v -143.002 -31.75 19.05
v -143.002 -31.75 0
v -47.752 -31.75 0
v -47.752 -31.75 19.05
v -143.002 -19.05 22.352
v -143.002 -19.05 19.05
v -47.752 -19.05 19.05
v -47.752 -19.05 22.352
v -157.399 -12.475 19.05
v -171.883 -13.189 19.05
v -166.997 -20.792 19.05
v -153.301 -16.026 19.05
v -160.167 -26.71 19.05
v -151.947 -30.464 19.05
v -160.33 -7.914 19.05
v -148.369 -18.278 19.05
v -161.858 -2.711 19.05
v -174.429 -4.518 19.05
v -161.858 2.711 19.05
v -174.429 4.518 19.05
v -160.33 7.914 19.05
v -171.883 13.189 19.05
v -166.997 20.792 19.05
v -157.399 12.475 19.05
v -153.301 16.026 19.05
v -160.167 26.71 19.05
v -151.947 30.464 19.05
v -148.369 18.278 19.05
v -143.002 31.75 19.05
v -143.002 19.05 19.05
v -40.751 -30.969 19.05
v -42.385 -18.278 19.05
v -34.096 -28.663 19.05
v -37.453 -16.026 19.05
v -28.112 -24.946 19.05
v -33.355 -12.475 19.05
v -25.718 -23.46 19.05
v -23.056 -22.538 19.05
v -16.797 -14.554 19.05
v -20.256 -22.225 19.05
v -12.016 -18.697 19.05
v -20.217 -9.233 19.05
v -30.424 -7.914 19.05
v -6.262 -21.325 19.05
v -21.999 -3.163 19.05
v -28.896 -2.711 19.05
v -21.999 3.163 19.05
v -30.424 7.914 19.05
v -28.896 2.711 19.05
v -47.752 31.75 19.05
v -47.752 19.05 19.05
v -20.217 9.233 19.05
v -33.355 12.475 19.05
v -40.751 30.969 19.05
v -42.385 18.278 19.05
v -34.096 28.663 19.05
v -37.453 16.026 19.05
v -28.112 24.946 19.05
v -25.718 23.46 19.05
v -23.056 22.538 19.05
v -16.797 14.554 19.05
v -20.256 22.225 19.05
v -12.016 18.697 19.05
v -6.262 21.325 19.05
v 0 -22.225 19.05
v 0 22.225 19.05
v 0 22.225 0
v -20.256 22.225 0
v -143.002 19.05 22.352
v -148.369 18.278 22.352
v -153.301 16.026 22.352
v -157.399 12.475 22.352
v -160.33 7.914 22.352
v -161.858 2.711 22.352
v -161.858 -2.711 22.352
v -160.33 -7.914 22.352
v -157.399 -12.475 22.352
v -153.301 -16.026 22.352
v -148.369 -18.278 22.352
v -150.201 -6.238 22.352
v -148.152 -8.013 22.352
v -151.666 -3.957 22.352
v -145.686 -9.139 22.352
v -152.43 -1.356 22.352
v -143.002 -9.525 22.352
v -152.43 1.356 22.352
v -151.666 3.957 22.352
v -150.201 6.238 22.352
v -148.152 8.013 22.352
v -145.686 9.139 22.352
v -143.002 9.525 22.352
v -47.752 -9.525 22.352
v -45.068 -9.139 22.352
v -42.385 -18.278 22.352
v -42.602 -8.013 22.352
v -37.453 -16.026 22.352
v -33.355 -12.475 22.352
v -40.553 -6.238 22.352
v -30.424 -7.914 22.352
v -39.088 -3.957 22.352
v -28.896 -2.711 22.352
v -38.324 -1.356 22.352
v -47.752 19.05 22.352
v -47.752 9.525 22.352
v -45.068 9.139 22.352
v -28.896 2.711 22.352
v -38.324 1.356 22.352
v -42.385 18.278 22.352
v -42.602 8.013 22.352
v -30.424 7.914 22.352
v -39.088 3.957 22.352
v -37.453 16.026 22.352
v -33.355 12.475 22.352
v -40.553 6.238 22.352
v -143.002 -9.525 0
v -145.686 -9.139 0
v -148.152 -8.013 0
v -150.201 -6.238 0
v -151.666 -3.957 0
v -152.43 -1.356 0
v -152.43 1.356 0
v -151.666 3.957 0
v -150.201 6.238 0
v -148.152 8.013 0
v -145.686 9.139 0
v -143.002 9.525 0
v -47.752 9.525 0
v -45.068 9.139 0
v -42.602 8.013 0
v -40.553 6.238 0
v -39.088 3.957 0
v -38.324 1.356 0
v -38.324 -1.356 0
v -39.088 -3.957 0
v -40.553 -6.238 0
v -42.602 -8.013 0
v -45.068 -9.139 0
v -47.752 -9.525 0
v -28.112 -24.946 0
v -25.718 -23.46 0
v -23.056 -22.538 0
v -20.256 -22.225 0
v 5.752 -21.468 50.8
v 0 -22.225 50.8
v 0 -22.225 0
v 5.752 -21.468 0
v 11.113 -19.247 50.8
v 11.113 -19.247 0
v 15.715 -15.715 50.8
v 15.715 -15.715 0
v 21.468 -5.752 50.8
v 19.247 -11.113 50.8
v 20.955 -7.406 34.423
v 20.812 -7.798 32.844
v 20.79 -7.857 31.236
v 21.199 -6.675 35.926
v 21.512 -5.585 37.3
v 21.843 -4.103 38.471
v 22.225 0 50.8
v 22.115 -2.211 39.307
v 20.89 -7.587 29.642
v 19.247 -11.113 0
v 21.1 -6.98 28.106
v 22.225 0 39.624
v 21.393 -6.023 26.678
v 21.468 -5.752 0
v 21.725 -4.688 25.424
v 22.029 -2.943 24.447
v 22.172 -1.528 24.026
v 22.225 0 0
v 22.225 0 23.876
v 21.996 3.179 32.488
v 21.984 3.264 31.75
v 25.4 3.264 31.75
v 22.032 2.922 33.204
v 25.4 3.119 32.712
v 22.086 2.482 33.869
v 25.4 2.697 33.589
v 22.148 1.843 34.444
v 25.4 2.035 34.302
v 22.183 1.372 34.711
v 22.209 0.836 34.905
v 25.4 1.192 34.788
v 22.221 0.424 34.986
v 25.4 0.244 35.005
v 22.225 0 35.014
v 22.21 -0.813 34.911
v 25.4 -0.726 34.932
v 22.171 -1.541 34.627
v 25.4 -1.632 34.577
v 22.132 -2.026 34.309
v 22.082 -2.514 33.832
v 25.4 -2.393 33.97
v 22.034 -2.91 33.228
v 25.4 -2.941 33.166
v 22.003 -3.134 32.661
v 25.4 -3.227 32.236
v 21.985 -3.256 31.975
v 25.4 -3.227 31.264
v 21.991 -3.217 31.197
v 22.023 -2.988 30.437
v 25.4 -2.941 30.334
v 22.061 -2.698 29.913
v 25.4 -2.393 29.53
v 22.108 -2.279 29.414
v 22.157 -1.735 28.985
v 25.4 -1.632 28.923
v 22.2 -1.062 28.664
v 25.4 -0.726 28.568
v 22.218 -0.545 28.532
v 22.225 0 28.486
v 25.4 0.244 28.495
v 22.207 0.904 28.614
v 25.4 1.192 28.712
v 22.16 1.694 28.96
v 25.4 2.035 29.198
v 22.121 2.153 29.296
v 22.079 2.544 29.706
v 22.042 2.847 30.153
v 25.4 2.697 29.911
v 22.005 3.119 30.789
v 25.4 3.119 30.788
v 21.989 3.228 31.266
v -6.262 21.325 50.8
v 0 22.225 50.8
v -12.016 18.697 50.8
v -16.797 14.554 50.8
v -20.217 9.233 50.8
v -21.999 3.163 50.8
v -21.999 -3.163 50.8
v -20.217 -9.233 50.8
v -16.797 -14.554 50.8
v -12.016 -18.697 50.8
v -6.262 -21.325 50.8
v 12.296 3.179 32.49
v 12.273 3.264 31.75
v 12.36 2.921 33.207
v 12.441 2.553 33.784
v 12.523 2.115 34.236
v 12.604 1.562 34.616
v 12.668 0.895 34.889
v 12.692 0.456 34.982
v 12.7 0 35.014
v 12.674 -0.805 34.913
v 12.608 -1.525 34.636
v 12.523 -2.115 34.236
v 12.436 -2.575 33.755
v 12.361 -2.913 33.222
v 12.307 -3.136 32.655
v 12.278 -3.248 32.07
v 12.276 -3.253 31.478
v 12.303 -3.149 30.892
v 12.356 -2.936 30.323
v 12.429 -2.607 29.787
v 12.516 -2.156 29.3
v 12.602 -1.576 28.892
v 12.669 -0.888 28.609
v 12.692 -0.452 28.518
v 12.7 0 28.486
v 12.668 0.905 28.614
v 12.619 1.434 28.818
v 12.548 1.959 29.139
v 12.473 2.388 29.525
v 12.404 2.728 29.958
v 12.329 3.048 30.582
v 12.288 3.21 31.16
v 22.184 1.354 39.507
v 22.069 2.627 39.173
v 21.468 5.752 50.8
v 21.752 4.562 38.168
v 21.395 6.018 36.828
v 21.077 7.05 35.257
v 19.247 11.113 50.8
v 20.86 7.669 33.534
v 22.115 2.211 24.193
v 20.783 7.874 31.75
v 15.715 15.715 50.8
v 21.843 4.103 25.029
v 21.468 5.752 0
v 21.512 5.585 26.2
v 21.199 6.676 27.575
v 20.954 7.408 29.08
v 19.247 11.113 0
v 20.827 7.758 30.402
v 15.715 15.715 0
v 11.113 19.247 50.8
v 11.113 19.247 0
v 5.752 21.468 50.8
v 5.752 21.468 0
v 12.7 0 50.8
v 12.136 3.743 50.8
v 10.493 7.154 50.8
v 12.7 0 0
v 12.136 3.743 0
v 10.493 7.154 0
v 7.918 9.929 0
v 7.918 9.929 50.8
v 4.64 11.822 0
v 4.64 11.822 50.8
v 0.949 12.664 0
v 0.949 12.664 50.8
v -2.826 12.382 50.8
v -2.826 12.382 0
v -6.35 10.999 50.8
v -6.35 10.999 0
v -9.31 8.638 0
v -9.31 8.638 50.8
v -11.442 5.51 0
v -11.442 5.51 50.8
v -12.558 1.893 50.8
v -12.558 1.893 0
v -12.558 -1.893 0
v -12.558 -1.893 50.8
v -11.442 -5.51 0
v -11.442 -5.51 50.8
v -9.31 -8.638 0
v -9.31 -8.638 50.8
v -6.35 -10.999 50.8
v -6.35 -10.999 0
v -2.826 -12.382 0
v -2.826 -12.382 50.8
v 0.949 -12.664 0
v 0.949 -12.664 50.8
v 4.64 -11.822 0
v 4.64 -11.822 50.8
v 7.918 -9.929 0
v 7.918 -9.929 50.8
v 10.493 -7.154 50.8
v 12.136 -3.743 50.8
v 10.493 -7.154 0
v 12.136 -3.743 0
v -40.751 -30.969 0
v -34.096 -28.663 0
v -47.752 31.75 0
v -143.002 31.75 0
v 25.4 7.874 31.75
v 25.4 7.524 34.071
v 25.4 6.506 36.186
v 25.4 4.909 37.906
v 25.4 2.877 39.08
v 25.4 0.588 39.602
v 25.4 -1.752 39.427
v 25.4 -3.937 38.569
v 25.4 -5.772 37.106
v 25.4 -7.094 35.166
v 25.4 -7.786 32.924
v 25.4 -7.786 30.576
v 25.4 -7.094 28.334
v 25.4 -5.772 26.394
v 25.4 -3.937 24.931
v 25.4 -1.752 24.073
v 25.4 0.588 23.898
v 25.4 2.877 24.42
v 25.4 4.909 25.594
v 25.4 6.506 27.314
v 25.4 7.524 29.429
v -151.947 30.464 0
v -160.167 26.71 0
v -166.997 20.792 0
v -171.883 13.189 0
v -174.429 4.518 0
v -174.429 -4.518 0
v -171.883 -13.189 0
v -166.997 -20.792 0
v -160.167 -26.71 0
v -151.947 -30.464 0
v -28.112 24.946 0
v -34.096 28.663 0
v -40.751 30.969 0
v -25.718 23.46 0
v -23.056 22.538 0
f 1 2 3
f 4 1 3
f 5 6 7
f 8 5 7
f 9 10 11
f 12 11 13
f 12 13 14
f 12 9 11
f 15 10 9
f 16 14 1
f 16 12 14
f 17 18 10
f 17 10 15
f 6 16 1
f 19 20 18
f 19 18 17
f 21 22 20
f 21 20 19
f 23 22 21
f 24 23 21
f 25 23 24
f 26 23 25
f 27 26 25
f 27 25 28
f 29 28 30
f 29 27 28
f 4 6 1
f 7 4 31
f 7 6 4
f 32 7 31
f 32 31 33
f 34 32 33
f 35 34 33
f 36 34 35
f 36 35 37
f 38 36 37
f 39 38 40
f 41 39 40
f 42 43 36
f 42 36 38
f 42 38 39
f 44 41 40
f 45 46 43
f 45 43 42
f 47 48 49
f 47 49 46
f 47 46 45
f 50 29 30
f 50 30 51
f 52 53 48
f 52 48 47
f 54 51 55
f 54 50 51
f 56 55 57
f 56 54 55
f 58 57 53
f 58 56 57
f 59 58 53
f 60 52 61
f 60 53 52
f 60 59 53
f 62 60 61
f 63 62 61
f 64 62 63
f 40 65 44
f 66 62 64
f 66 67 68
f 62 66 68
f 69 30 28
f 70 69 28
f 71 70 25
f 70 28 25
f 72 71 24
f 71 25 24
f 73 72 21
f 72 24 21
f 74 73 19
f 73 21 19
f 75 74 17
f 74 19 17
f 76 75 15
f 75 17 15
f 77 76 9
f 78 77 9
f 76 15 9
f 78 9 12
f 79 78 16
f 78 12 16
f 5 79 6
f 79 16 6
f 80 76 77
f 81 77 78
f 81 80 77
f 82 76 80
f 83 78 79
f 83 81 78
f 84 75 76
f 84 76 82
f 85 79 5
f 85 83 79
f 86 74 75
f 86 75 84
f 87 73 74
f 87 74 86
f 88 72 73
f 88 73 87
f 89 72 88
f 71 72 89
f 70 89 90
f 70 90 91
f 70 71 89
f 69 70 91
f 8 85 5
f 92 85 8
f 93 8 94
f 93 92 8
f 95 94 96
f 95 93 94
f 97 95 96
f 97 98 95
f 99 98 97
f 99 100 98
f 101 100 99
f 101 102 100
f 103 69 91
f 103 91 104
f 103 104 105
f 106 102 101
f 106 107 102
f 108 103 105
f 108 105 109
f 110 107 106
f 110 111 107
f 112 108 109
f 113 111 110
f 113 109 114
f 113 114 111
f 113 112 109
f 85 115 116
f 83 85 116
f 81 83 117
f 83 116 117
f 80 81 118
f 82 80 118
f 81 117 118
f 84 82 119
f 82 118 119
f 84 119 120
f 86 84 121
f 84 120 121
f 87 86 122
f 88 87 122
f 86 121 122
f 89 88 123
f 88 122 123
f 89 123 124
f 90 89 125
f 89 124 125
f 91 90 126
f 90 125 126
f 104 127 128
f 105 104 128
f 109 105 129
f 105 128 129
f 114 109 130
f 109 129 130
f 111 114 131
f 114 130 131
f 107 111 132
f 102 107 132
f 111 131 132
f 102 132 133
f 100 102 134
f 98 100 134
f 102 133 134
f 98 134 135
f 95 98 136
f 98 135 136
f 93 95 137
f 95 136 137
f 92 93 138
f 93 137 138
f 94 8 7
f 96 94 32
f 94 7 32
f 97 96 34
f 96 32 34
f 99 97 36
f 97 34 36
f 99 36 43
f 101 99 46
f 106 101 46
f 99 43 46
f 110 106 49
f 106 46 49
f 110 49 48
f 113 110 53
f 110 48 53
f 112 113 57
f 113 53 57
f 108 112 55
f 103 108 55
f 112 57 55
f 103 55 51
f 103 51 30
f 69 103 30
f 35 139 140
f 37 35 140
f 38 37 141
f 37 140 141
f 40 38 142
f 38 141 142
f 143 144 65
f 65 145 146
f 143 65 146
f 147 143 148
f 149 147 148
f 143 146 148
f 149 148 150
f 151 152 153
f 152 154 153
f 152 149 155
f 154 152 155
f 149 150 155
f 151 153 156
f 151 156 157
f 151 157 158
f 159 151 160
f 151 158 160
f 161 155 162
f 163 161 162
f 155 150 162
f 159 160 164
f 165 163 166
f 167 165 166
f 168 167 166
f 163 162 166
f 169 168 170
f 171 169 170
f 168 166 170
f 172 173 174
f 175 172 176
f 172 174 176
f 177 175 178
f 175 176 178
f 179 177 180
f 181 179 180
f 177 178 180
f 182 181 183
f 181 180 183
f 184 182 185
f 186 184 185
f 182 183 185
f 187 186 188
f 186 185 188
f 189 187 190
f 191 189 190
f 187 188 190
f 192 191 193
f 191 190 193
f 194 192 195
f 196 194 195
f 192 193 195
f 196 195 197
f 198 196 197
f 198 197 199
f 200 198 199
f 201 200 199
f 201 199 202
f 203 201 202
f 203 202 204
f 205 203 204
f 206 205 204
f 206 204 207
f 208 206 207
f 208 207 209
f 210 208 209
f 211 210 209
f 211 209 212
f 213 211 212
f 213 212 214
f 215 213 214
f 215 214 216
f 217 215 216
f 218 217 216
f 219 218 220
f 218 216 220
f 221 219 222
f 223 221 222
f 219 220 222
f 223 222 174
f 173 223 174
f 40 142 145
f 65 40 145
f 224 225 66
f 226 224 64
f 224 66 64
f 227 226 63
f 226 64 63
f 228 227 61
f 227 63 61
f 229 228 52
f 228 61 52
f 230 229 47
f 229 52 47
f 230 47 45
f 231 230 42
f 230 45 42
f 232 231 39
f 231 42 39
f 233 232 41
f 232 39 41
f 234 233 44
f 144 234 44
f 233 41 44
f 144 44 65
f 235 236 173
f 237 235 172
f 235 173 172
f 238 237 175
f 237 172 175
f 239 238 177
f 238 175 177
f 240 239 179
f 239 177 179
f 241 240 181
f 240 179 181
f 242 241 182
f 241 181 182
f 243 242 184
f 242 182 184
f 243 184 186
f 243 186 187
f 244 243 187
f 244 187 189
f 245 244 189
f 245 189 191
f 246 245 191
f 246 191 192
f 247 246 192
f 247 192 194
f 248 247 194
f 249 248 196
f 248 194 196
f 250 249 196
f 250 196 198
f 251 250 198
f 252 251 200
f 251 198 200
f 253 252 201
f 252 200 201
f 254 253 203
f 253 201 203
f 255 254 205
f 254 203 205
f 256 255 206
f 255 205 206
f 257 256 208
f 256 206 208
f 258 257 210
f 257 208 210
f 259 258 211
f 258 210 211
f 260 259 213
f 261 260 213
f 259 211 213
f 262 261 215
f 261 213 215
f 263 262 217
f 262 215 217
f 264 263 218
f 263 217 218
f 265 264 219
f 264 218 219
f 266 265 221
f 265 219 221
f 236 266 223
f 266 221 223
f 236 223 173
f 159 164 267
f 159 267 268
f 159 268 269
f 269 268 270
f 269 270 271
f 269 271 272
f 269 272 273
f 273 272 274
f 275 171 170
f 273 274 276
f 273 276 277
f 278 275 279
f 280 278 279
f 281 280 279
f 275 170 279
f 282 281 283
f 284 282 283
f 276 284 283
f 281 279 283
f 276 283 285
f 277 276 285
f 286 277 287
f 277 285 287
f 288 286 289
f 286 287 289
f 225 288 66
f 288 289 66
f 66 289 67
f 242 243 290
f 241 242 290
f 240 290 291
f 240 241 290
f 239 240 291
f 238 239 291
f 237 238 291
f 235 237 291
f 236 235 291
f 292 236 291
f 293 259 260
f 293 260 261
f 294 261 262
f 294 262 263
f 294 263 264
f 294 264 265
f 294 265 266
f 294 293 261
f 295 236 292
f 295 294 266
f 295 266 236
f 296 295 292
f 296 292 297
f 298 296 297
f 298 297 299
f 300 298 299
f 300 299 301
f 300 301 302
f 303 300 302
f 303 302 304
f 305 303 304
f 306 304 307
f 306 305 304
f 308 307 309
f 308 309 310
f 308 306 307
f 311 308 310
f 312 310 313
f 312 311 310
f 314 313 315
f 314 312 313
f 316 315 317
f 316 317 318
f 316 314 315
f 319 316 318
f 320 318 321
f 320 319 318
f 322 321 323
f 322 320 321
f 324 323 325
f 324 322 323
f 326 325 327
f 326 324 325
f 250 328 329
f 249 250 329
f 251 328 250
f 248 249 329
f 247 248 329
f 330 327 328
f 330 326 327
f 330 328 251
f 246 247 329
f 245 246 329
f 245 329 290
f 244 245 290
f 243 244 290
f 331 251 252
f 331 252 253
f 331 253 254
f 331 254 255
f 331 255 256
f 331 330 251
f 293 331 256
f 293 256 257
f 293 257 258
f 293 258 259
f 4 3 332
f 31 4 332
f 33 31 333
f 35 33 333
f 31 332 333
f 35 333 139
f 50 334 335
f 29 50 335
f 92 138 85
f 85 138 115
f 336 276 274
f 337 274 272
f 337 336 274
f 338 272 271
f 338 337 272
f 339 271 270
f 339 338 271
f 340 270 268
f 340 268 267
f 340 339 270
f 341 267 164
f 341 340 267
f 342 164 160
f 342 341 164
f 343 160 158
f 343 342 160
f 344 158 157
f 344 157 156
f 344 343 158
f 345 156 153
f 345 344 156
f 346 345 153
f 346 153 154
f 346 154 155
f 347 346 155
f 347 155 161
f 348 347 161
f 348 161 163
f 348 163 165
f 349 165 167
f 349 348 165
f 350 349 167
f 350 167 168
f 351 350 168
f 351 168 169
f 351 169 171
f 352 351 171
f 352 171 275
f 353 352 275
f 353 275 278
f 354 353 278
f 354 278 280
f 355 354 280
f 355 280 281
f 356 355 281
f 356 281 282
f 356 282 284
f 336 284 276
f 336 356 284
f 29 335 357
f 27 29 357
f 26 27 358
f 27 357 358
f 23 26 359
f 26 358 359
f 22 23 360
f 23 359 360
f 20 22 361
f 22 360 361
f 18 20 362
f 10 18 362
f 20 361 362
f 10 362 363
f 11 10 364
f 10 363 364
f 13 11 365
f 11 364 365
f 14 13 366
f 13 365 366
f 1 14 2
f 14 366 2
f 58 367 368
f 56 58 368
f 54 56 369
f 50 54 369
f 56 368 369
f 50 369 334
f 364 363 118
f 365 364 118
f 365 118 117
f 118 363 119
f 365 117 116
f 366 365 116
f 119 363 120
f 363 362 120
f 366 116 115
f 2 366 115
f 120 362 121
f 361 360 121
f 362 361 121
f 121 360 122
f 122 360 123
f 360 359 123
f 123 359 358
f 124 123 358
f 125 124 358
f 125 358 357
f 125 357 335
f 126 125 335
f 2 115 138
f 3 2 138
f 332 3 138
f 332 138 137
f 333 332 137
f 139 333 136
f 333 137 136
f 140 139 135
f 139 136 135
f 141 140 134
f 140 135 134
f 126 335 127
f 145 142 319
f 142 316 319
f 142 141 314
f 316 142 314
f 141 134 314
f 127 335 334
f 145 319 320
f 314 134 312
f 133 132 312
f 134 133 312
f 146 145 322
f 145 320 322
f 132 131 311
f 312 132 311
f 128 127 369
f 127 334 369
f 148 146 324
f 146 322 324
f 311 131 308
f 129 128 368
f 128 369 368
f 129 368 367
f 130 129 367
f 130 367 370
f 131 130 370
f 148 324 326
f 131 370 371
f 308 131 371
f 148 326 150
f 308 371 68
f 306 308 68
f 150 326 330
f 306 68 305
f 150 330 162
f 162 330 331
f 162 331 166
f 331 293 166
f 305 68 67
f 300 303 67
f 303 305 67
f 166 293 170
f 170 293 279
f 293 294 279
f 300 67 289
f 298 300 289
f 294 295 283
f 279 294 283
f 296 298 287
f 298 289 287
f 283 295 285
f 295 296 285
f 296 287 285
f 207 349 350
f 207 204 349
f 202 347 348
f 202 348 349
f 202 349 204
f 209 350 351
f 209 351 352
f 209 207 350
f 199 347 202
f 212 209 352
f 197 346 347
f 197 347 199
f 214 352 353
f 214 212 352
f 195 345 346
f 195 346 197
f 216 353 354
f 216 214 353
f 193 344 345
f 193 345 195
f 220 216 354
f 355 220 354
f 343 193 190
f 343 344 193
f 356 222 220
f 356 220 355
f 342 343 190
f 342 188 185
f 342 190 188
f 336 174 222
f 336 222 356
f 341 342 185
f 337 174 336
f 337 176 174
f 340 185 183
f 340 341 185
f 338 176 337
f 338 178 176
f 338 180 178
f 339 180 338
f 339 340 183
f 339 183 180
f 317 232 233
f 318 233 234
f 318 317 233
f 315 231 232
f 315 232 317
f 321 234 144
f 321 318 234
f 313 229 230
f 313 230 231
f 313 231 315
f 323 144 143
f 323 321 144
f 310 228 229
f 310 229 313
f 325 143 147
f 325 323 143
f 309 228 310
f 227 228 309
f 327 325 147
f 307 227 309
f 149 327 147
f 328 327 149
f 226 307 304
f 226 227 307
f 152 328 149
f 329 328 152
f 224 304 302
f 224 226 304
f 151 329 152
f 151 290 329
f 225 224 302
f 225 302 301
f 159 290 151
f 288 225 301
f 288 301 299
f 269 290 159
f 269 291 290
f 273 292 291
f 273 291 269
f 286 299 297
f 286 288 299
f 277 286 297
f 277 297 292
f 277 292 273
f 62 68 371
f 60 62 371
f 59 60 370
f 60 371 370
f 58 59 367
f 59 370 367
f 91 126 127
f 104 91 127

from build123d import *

# Parameters (mm, degrees)
F0_R     = 12.7
F1_DEPTH = 50.8
F2_DEPTH = 19.05
F3_DEPTH = 22.352
F5_R     = 7.874
F5_R_2   = 3.2639
F7_DEPTH = 19.05


with BuildPart() as f1:
    # F0 (on Top) → F1 (new body)
    with BuildSketch(Plane.XY):
        with BuildLine():
            ThreePointArc((0, -22.225), (15.7154482119, -15.7154482119), (22.225, 0))
            ThreePointArc((22.225, 0), (15.7154482119, 15.7154482119), (0, 22.225))
            ThreePointArc((0, 22.225), (-22.225, 0), (0, -22.225))
        make_face()
        Circle(F0_R, mode=Mode.SUBTRACT)
    extrude(amount=F1_DEPTH)

    # F0 (on Top) → F2 (join)
    with BuildSketch(Plane.XY):
        with BuildLine():
            ThreePointArc((0, -22.225), (15.7154482119, -15.7154482119), (22.225, 0))
            ThreePointArc((22.225, 0), (15.7154482119, 15.7154482119), (0, 22.225))
            ThreePointArc((0, 22.225), (-22.225, 0), (0, -22.225))
        make_face()
        Circle(F0_R, mode=Mode.SUBTRACT)
        with BuildLine():
            ThreePointArc((0, -22.225), (-22.225, 0), (0, 22.225))
            Line((0, 22.225), (-20.2556934298, 22.225))
            ThreePointArc((-20.2556934298, 22.225), (-24.4127442388, 22.924627982), (-28.1117810213, 24.9464285714))
            ThreePointArc((-28.1117810213, 24.9464285714), (-37.3593729775, 30.0009300451), (-47.752, 31.75))
            Line((-47.752, 31.75), (-143.002, 31.75))
            ThreePointArc((-143.002, 31.75), (-174.752, 0), (-143.002, -31.75))
            Line((-143.002, -31.75), (-47.752, -31.75))
            ThreePointArc((-47.752, -31.75), (-37.3593729775, -30.0009300451), (-28.1117810213, -24.9464285714))
            ThreePointArc((-28.1117810213, -24.9464285714), (-24.4127442388, -22.924627982), (-20.2556934298, -22.225))
            Line((-20.2556934298, -22.225), (0, -22.225))
        make_face()
        with BuildLine():
            Line((-143.002, 19.05), (-47.752, 19.05))
            ThreePointArc((-47.752, 19.05), (-28.702, 0), (-47.752, -19.05))
            Line((-47.752, -19.05), (-143.002, -19.05))
            ThreePointArc((-143.002, -19.05), (-162.052, 0), (-143.002, 19.05))
        make_face(mode=Mode.SUBTRACT)
    extrude(amount=F2_DEPTH)

    # F0 (on Top) → F3 (join)
    with BuildSketch(Plane.XY):
        with BuildLine():
            ThreePointArc((-47.752, -19.05), (-28.702, 0), (-47.752, 19.05))
            Line((-47.752, 19.05), (-143.002, 19.05))
            ThreePointArc((-143.002, 19.05), (-162.052, 0), (-143.002, -19.05))
            Line((-143.002, -19.05), (-47.752, -19.05))
        make_face()
        with BuildLine():
            Line((-143.002, 9.525), (-47.752, 9.525))
            ThreePointArc((-47.752, 9.525), (-38.227, 0), (-47.752, -9.525))
            Line((-47.752, -9.525), (-143.002, -9.525))
            ThreePointArc((-143.002, -9.525), (-152.527, 0), (-143.002, 9.525))
        make_face(mode=Mode.SUBTRACT)
    extrude(amount=F3_DEPTH)

    # F5 (on offset) → F6 (join, up to the next surface of F1)
    with BuildSketch(Plane.YZ.offset(25.4)):
        with Locations((0, 31.75)):
            Circle(F5_R)
        with Locations((0, 31.75)):
            Circle(F5_R_2, mode=Mode.SUBTRACT)
    extrude(until=Until.NEXT, dir=(-1, 0, 0))

    # F5 (on offset) → F7 (cut)
    with BuildSketch(Plane.YZ.offset(25.4)):
        with Locations((0, 31.75)):
            Circle(F5_R_2)
    extrude(amount=-F7_DEPTH, mode=Mode.SUBTRACT)


solid = f1.part
